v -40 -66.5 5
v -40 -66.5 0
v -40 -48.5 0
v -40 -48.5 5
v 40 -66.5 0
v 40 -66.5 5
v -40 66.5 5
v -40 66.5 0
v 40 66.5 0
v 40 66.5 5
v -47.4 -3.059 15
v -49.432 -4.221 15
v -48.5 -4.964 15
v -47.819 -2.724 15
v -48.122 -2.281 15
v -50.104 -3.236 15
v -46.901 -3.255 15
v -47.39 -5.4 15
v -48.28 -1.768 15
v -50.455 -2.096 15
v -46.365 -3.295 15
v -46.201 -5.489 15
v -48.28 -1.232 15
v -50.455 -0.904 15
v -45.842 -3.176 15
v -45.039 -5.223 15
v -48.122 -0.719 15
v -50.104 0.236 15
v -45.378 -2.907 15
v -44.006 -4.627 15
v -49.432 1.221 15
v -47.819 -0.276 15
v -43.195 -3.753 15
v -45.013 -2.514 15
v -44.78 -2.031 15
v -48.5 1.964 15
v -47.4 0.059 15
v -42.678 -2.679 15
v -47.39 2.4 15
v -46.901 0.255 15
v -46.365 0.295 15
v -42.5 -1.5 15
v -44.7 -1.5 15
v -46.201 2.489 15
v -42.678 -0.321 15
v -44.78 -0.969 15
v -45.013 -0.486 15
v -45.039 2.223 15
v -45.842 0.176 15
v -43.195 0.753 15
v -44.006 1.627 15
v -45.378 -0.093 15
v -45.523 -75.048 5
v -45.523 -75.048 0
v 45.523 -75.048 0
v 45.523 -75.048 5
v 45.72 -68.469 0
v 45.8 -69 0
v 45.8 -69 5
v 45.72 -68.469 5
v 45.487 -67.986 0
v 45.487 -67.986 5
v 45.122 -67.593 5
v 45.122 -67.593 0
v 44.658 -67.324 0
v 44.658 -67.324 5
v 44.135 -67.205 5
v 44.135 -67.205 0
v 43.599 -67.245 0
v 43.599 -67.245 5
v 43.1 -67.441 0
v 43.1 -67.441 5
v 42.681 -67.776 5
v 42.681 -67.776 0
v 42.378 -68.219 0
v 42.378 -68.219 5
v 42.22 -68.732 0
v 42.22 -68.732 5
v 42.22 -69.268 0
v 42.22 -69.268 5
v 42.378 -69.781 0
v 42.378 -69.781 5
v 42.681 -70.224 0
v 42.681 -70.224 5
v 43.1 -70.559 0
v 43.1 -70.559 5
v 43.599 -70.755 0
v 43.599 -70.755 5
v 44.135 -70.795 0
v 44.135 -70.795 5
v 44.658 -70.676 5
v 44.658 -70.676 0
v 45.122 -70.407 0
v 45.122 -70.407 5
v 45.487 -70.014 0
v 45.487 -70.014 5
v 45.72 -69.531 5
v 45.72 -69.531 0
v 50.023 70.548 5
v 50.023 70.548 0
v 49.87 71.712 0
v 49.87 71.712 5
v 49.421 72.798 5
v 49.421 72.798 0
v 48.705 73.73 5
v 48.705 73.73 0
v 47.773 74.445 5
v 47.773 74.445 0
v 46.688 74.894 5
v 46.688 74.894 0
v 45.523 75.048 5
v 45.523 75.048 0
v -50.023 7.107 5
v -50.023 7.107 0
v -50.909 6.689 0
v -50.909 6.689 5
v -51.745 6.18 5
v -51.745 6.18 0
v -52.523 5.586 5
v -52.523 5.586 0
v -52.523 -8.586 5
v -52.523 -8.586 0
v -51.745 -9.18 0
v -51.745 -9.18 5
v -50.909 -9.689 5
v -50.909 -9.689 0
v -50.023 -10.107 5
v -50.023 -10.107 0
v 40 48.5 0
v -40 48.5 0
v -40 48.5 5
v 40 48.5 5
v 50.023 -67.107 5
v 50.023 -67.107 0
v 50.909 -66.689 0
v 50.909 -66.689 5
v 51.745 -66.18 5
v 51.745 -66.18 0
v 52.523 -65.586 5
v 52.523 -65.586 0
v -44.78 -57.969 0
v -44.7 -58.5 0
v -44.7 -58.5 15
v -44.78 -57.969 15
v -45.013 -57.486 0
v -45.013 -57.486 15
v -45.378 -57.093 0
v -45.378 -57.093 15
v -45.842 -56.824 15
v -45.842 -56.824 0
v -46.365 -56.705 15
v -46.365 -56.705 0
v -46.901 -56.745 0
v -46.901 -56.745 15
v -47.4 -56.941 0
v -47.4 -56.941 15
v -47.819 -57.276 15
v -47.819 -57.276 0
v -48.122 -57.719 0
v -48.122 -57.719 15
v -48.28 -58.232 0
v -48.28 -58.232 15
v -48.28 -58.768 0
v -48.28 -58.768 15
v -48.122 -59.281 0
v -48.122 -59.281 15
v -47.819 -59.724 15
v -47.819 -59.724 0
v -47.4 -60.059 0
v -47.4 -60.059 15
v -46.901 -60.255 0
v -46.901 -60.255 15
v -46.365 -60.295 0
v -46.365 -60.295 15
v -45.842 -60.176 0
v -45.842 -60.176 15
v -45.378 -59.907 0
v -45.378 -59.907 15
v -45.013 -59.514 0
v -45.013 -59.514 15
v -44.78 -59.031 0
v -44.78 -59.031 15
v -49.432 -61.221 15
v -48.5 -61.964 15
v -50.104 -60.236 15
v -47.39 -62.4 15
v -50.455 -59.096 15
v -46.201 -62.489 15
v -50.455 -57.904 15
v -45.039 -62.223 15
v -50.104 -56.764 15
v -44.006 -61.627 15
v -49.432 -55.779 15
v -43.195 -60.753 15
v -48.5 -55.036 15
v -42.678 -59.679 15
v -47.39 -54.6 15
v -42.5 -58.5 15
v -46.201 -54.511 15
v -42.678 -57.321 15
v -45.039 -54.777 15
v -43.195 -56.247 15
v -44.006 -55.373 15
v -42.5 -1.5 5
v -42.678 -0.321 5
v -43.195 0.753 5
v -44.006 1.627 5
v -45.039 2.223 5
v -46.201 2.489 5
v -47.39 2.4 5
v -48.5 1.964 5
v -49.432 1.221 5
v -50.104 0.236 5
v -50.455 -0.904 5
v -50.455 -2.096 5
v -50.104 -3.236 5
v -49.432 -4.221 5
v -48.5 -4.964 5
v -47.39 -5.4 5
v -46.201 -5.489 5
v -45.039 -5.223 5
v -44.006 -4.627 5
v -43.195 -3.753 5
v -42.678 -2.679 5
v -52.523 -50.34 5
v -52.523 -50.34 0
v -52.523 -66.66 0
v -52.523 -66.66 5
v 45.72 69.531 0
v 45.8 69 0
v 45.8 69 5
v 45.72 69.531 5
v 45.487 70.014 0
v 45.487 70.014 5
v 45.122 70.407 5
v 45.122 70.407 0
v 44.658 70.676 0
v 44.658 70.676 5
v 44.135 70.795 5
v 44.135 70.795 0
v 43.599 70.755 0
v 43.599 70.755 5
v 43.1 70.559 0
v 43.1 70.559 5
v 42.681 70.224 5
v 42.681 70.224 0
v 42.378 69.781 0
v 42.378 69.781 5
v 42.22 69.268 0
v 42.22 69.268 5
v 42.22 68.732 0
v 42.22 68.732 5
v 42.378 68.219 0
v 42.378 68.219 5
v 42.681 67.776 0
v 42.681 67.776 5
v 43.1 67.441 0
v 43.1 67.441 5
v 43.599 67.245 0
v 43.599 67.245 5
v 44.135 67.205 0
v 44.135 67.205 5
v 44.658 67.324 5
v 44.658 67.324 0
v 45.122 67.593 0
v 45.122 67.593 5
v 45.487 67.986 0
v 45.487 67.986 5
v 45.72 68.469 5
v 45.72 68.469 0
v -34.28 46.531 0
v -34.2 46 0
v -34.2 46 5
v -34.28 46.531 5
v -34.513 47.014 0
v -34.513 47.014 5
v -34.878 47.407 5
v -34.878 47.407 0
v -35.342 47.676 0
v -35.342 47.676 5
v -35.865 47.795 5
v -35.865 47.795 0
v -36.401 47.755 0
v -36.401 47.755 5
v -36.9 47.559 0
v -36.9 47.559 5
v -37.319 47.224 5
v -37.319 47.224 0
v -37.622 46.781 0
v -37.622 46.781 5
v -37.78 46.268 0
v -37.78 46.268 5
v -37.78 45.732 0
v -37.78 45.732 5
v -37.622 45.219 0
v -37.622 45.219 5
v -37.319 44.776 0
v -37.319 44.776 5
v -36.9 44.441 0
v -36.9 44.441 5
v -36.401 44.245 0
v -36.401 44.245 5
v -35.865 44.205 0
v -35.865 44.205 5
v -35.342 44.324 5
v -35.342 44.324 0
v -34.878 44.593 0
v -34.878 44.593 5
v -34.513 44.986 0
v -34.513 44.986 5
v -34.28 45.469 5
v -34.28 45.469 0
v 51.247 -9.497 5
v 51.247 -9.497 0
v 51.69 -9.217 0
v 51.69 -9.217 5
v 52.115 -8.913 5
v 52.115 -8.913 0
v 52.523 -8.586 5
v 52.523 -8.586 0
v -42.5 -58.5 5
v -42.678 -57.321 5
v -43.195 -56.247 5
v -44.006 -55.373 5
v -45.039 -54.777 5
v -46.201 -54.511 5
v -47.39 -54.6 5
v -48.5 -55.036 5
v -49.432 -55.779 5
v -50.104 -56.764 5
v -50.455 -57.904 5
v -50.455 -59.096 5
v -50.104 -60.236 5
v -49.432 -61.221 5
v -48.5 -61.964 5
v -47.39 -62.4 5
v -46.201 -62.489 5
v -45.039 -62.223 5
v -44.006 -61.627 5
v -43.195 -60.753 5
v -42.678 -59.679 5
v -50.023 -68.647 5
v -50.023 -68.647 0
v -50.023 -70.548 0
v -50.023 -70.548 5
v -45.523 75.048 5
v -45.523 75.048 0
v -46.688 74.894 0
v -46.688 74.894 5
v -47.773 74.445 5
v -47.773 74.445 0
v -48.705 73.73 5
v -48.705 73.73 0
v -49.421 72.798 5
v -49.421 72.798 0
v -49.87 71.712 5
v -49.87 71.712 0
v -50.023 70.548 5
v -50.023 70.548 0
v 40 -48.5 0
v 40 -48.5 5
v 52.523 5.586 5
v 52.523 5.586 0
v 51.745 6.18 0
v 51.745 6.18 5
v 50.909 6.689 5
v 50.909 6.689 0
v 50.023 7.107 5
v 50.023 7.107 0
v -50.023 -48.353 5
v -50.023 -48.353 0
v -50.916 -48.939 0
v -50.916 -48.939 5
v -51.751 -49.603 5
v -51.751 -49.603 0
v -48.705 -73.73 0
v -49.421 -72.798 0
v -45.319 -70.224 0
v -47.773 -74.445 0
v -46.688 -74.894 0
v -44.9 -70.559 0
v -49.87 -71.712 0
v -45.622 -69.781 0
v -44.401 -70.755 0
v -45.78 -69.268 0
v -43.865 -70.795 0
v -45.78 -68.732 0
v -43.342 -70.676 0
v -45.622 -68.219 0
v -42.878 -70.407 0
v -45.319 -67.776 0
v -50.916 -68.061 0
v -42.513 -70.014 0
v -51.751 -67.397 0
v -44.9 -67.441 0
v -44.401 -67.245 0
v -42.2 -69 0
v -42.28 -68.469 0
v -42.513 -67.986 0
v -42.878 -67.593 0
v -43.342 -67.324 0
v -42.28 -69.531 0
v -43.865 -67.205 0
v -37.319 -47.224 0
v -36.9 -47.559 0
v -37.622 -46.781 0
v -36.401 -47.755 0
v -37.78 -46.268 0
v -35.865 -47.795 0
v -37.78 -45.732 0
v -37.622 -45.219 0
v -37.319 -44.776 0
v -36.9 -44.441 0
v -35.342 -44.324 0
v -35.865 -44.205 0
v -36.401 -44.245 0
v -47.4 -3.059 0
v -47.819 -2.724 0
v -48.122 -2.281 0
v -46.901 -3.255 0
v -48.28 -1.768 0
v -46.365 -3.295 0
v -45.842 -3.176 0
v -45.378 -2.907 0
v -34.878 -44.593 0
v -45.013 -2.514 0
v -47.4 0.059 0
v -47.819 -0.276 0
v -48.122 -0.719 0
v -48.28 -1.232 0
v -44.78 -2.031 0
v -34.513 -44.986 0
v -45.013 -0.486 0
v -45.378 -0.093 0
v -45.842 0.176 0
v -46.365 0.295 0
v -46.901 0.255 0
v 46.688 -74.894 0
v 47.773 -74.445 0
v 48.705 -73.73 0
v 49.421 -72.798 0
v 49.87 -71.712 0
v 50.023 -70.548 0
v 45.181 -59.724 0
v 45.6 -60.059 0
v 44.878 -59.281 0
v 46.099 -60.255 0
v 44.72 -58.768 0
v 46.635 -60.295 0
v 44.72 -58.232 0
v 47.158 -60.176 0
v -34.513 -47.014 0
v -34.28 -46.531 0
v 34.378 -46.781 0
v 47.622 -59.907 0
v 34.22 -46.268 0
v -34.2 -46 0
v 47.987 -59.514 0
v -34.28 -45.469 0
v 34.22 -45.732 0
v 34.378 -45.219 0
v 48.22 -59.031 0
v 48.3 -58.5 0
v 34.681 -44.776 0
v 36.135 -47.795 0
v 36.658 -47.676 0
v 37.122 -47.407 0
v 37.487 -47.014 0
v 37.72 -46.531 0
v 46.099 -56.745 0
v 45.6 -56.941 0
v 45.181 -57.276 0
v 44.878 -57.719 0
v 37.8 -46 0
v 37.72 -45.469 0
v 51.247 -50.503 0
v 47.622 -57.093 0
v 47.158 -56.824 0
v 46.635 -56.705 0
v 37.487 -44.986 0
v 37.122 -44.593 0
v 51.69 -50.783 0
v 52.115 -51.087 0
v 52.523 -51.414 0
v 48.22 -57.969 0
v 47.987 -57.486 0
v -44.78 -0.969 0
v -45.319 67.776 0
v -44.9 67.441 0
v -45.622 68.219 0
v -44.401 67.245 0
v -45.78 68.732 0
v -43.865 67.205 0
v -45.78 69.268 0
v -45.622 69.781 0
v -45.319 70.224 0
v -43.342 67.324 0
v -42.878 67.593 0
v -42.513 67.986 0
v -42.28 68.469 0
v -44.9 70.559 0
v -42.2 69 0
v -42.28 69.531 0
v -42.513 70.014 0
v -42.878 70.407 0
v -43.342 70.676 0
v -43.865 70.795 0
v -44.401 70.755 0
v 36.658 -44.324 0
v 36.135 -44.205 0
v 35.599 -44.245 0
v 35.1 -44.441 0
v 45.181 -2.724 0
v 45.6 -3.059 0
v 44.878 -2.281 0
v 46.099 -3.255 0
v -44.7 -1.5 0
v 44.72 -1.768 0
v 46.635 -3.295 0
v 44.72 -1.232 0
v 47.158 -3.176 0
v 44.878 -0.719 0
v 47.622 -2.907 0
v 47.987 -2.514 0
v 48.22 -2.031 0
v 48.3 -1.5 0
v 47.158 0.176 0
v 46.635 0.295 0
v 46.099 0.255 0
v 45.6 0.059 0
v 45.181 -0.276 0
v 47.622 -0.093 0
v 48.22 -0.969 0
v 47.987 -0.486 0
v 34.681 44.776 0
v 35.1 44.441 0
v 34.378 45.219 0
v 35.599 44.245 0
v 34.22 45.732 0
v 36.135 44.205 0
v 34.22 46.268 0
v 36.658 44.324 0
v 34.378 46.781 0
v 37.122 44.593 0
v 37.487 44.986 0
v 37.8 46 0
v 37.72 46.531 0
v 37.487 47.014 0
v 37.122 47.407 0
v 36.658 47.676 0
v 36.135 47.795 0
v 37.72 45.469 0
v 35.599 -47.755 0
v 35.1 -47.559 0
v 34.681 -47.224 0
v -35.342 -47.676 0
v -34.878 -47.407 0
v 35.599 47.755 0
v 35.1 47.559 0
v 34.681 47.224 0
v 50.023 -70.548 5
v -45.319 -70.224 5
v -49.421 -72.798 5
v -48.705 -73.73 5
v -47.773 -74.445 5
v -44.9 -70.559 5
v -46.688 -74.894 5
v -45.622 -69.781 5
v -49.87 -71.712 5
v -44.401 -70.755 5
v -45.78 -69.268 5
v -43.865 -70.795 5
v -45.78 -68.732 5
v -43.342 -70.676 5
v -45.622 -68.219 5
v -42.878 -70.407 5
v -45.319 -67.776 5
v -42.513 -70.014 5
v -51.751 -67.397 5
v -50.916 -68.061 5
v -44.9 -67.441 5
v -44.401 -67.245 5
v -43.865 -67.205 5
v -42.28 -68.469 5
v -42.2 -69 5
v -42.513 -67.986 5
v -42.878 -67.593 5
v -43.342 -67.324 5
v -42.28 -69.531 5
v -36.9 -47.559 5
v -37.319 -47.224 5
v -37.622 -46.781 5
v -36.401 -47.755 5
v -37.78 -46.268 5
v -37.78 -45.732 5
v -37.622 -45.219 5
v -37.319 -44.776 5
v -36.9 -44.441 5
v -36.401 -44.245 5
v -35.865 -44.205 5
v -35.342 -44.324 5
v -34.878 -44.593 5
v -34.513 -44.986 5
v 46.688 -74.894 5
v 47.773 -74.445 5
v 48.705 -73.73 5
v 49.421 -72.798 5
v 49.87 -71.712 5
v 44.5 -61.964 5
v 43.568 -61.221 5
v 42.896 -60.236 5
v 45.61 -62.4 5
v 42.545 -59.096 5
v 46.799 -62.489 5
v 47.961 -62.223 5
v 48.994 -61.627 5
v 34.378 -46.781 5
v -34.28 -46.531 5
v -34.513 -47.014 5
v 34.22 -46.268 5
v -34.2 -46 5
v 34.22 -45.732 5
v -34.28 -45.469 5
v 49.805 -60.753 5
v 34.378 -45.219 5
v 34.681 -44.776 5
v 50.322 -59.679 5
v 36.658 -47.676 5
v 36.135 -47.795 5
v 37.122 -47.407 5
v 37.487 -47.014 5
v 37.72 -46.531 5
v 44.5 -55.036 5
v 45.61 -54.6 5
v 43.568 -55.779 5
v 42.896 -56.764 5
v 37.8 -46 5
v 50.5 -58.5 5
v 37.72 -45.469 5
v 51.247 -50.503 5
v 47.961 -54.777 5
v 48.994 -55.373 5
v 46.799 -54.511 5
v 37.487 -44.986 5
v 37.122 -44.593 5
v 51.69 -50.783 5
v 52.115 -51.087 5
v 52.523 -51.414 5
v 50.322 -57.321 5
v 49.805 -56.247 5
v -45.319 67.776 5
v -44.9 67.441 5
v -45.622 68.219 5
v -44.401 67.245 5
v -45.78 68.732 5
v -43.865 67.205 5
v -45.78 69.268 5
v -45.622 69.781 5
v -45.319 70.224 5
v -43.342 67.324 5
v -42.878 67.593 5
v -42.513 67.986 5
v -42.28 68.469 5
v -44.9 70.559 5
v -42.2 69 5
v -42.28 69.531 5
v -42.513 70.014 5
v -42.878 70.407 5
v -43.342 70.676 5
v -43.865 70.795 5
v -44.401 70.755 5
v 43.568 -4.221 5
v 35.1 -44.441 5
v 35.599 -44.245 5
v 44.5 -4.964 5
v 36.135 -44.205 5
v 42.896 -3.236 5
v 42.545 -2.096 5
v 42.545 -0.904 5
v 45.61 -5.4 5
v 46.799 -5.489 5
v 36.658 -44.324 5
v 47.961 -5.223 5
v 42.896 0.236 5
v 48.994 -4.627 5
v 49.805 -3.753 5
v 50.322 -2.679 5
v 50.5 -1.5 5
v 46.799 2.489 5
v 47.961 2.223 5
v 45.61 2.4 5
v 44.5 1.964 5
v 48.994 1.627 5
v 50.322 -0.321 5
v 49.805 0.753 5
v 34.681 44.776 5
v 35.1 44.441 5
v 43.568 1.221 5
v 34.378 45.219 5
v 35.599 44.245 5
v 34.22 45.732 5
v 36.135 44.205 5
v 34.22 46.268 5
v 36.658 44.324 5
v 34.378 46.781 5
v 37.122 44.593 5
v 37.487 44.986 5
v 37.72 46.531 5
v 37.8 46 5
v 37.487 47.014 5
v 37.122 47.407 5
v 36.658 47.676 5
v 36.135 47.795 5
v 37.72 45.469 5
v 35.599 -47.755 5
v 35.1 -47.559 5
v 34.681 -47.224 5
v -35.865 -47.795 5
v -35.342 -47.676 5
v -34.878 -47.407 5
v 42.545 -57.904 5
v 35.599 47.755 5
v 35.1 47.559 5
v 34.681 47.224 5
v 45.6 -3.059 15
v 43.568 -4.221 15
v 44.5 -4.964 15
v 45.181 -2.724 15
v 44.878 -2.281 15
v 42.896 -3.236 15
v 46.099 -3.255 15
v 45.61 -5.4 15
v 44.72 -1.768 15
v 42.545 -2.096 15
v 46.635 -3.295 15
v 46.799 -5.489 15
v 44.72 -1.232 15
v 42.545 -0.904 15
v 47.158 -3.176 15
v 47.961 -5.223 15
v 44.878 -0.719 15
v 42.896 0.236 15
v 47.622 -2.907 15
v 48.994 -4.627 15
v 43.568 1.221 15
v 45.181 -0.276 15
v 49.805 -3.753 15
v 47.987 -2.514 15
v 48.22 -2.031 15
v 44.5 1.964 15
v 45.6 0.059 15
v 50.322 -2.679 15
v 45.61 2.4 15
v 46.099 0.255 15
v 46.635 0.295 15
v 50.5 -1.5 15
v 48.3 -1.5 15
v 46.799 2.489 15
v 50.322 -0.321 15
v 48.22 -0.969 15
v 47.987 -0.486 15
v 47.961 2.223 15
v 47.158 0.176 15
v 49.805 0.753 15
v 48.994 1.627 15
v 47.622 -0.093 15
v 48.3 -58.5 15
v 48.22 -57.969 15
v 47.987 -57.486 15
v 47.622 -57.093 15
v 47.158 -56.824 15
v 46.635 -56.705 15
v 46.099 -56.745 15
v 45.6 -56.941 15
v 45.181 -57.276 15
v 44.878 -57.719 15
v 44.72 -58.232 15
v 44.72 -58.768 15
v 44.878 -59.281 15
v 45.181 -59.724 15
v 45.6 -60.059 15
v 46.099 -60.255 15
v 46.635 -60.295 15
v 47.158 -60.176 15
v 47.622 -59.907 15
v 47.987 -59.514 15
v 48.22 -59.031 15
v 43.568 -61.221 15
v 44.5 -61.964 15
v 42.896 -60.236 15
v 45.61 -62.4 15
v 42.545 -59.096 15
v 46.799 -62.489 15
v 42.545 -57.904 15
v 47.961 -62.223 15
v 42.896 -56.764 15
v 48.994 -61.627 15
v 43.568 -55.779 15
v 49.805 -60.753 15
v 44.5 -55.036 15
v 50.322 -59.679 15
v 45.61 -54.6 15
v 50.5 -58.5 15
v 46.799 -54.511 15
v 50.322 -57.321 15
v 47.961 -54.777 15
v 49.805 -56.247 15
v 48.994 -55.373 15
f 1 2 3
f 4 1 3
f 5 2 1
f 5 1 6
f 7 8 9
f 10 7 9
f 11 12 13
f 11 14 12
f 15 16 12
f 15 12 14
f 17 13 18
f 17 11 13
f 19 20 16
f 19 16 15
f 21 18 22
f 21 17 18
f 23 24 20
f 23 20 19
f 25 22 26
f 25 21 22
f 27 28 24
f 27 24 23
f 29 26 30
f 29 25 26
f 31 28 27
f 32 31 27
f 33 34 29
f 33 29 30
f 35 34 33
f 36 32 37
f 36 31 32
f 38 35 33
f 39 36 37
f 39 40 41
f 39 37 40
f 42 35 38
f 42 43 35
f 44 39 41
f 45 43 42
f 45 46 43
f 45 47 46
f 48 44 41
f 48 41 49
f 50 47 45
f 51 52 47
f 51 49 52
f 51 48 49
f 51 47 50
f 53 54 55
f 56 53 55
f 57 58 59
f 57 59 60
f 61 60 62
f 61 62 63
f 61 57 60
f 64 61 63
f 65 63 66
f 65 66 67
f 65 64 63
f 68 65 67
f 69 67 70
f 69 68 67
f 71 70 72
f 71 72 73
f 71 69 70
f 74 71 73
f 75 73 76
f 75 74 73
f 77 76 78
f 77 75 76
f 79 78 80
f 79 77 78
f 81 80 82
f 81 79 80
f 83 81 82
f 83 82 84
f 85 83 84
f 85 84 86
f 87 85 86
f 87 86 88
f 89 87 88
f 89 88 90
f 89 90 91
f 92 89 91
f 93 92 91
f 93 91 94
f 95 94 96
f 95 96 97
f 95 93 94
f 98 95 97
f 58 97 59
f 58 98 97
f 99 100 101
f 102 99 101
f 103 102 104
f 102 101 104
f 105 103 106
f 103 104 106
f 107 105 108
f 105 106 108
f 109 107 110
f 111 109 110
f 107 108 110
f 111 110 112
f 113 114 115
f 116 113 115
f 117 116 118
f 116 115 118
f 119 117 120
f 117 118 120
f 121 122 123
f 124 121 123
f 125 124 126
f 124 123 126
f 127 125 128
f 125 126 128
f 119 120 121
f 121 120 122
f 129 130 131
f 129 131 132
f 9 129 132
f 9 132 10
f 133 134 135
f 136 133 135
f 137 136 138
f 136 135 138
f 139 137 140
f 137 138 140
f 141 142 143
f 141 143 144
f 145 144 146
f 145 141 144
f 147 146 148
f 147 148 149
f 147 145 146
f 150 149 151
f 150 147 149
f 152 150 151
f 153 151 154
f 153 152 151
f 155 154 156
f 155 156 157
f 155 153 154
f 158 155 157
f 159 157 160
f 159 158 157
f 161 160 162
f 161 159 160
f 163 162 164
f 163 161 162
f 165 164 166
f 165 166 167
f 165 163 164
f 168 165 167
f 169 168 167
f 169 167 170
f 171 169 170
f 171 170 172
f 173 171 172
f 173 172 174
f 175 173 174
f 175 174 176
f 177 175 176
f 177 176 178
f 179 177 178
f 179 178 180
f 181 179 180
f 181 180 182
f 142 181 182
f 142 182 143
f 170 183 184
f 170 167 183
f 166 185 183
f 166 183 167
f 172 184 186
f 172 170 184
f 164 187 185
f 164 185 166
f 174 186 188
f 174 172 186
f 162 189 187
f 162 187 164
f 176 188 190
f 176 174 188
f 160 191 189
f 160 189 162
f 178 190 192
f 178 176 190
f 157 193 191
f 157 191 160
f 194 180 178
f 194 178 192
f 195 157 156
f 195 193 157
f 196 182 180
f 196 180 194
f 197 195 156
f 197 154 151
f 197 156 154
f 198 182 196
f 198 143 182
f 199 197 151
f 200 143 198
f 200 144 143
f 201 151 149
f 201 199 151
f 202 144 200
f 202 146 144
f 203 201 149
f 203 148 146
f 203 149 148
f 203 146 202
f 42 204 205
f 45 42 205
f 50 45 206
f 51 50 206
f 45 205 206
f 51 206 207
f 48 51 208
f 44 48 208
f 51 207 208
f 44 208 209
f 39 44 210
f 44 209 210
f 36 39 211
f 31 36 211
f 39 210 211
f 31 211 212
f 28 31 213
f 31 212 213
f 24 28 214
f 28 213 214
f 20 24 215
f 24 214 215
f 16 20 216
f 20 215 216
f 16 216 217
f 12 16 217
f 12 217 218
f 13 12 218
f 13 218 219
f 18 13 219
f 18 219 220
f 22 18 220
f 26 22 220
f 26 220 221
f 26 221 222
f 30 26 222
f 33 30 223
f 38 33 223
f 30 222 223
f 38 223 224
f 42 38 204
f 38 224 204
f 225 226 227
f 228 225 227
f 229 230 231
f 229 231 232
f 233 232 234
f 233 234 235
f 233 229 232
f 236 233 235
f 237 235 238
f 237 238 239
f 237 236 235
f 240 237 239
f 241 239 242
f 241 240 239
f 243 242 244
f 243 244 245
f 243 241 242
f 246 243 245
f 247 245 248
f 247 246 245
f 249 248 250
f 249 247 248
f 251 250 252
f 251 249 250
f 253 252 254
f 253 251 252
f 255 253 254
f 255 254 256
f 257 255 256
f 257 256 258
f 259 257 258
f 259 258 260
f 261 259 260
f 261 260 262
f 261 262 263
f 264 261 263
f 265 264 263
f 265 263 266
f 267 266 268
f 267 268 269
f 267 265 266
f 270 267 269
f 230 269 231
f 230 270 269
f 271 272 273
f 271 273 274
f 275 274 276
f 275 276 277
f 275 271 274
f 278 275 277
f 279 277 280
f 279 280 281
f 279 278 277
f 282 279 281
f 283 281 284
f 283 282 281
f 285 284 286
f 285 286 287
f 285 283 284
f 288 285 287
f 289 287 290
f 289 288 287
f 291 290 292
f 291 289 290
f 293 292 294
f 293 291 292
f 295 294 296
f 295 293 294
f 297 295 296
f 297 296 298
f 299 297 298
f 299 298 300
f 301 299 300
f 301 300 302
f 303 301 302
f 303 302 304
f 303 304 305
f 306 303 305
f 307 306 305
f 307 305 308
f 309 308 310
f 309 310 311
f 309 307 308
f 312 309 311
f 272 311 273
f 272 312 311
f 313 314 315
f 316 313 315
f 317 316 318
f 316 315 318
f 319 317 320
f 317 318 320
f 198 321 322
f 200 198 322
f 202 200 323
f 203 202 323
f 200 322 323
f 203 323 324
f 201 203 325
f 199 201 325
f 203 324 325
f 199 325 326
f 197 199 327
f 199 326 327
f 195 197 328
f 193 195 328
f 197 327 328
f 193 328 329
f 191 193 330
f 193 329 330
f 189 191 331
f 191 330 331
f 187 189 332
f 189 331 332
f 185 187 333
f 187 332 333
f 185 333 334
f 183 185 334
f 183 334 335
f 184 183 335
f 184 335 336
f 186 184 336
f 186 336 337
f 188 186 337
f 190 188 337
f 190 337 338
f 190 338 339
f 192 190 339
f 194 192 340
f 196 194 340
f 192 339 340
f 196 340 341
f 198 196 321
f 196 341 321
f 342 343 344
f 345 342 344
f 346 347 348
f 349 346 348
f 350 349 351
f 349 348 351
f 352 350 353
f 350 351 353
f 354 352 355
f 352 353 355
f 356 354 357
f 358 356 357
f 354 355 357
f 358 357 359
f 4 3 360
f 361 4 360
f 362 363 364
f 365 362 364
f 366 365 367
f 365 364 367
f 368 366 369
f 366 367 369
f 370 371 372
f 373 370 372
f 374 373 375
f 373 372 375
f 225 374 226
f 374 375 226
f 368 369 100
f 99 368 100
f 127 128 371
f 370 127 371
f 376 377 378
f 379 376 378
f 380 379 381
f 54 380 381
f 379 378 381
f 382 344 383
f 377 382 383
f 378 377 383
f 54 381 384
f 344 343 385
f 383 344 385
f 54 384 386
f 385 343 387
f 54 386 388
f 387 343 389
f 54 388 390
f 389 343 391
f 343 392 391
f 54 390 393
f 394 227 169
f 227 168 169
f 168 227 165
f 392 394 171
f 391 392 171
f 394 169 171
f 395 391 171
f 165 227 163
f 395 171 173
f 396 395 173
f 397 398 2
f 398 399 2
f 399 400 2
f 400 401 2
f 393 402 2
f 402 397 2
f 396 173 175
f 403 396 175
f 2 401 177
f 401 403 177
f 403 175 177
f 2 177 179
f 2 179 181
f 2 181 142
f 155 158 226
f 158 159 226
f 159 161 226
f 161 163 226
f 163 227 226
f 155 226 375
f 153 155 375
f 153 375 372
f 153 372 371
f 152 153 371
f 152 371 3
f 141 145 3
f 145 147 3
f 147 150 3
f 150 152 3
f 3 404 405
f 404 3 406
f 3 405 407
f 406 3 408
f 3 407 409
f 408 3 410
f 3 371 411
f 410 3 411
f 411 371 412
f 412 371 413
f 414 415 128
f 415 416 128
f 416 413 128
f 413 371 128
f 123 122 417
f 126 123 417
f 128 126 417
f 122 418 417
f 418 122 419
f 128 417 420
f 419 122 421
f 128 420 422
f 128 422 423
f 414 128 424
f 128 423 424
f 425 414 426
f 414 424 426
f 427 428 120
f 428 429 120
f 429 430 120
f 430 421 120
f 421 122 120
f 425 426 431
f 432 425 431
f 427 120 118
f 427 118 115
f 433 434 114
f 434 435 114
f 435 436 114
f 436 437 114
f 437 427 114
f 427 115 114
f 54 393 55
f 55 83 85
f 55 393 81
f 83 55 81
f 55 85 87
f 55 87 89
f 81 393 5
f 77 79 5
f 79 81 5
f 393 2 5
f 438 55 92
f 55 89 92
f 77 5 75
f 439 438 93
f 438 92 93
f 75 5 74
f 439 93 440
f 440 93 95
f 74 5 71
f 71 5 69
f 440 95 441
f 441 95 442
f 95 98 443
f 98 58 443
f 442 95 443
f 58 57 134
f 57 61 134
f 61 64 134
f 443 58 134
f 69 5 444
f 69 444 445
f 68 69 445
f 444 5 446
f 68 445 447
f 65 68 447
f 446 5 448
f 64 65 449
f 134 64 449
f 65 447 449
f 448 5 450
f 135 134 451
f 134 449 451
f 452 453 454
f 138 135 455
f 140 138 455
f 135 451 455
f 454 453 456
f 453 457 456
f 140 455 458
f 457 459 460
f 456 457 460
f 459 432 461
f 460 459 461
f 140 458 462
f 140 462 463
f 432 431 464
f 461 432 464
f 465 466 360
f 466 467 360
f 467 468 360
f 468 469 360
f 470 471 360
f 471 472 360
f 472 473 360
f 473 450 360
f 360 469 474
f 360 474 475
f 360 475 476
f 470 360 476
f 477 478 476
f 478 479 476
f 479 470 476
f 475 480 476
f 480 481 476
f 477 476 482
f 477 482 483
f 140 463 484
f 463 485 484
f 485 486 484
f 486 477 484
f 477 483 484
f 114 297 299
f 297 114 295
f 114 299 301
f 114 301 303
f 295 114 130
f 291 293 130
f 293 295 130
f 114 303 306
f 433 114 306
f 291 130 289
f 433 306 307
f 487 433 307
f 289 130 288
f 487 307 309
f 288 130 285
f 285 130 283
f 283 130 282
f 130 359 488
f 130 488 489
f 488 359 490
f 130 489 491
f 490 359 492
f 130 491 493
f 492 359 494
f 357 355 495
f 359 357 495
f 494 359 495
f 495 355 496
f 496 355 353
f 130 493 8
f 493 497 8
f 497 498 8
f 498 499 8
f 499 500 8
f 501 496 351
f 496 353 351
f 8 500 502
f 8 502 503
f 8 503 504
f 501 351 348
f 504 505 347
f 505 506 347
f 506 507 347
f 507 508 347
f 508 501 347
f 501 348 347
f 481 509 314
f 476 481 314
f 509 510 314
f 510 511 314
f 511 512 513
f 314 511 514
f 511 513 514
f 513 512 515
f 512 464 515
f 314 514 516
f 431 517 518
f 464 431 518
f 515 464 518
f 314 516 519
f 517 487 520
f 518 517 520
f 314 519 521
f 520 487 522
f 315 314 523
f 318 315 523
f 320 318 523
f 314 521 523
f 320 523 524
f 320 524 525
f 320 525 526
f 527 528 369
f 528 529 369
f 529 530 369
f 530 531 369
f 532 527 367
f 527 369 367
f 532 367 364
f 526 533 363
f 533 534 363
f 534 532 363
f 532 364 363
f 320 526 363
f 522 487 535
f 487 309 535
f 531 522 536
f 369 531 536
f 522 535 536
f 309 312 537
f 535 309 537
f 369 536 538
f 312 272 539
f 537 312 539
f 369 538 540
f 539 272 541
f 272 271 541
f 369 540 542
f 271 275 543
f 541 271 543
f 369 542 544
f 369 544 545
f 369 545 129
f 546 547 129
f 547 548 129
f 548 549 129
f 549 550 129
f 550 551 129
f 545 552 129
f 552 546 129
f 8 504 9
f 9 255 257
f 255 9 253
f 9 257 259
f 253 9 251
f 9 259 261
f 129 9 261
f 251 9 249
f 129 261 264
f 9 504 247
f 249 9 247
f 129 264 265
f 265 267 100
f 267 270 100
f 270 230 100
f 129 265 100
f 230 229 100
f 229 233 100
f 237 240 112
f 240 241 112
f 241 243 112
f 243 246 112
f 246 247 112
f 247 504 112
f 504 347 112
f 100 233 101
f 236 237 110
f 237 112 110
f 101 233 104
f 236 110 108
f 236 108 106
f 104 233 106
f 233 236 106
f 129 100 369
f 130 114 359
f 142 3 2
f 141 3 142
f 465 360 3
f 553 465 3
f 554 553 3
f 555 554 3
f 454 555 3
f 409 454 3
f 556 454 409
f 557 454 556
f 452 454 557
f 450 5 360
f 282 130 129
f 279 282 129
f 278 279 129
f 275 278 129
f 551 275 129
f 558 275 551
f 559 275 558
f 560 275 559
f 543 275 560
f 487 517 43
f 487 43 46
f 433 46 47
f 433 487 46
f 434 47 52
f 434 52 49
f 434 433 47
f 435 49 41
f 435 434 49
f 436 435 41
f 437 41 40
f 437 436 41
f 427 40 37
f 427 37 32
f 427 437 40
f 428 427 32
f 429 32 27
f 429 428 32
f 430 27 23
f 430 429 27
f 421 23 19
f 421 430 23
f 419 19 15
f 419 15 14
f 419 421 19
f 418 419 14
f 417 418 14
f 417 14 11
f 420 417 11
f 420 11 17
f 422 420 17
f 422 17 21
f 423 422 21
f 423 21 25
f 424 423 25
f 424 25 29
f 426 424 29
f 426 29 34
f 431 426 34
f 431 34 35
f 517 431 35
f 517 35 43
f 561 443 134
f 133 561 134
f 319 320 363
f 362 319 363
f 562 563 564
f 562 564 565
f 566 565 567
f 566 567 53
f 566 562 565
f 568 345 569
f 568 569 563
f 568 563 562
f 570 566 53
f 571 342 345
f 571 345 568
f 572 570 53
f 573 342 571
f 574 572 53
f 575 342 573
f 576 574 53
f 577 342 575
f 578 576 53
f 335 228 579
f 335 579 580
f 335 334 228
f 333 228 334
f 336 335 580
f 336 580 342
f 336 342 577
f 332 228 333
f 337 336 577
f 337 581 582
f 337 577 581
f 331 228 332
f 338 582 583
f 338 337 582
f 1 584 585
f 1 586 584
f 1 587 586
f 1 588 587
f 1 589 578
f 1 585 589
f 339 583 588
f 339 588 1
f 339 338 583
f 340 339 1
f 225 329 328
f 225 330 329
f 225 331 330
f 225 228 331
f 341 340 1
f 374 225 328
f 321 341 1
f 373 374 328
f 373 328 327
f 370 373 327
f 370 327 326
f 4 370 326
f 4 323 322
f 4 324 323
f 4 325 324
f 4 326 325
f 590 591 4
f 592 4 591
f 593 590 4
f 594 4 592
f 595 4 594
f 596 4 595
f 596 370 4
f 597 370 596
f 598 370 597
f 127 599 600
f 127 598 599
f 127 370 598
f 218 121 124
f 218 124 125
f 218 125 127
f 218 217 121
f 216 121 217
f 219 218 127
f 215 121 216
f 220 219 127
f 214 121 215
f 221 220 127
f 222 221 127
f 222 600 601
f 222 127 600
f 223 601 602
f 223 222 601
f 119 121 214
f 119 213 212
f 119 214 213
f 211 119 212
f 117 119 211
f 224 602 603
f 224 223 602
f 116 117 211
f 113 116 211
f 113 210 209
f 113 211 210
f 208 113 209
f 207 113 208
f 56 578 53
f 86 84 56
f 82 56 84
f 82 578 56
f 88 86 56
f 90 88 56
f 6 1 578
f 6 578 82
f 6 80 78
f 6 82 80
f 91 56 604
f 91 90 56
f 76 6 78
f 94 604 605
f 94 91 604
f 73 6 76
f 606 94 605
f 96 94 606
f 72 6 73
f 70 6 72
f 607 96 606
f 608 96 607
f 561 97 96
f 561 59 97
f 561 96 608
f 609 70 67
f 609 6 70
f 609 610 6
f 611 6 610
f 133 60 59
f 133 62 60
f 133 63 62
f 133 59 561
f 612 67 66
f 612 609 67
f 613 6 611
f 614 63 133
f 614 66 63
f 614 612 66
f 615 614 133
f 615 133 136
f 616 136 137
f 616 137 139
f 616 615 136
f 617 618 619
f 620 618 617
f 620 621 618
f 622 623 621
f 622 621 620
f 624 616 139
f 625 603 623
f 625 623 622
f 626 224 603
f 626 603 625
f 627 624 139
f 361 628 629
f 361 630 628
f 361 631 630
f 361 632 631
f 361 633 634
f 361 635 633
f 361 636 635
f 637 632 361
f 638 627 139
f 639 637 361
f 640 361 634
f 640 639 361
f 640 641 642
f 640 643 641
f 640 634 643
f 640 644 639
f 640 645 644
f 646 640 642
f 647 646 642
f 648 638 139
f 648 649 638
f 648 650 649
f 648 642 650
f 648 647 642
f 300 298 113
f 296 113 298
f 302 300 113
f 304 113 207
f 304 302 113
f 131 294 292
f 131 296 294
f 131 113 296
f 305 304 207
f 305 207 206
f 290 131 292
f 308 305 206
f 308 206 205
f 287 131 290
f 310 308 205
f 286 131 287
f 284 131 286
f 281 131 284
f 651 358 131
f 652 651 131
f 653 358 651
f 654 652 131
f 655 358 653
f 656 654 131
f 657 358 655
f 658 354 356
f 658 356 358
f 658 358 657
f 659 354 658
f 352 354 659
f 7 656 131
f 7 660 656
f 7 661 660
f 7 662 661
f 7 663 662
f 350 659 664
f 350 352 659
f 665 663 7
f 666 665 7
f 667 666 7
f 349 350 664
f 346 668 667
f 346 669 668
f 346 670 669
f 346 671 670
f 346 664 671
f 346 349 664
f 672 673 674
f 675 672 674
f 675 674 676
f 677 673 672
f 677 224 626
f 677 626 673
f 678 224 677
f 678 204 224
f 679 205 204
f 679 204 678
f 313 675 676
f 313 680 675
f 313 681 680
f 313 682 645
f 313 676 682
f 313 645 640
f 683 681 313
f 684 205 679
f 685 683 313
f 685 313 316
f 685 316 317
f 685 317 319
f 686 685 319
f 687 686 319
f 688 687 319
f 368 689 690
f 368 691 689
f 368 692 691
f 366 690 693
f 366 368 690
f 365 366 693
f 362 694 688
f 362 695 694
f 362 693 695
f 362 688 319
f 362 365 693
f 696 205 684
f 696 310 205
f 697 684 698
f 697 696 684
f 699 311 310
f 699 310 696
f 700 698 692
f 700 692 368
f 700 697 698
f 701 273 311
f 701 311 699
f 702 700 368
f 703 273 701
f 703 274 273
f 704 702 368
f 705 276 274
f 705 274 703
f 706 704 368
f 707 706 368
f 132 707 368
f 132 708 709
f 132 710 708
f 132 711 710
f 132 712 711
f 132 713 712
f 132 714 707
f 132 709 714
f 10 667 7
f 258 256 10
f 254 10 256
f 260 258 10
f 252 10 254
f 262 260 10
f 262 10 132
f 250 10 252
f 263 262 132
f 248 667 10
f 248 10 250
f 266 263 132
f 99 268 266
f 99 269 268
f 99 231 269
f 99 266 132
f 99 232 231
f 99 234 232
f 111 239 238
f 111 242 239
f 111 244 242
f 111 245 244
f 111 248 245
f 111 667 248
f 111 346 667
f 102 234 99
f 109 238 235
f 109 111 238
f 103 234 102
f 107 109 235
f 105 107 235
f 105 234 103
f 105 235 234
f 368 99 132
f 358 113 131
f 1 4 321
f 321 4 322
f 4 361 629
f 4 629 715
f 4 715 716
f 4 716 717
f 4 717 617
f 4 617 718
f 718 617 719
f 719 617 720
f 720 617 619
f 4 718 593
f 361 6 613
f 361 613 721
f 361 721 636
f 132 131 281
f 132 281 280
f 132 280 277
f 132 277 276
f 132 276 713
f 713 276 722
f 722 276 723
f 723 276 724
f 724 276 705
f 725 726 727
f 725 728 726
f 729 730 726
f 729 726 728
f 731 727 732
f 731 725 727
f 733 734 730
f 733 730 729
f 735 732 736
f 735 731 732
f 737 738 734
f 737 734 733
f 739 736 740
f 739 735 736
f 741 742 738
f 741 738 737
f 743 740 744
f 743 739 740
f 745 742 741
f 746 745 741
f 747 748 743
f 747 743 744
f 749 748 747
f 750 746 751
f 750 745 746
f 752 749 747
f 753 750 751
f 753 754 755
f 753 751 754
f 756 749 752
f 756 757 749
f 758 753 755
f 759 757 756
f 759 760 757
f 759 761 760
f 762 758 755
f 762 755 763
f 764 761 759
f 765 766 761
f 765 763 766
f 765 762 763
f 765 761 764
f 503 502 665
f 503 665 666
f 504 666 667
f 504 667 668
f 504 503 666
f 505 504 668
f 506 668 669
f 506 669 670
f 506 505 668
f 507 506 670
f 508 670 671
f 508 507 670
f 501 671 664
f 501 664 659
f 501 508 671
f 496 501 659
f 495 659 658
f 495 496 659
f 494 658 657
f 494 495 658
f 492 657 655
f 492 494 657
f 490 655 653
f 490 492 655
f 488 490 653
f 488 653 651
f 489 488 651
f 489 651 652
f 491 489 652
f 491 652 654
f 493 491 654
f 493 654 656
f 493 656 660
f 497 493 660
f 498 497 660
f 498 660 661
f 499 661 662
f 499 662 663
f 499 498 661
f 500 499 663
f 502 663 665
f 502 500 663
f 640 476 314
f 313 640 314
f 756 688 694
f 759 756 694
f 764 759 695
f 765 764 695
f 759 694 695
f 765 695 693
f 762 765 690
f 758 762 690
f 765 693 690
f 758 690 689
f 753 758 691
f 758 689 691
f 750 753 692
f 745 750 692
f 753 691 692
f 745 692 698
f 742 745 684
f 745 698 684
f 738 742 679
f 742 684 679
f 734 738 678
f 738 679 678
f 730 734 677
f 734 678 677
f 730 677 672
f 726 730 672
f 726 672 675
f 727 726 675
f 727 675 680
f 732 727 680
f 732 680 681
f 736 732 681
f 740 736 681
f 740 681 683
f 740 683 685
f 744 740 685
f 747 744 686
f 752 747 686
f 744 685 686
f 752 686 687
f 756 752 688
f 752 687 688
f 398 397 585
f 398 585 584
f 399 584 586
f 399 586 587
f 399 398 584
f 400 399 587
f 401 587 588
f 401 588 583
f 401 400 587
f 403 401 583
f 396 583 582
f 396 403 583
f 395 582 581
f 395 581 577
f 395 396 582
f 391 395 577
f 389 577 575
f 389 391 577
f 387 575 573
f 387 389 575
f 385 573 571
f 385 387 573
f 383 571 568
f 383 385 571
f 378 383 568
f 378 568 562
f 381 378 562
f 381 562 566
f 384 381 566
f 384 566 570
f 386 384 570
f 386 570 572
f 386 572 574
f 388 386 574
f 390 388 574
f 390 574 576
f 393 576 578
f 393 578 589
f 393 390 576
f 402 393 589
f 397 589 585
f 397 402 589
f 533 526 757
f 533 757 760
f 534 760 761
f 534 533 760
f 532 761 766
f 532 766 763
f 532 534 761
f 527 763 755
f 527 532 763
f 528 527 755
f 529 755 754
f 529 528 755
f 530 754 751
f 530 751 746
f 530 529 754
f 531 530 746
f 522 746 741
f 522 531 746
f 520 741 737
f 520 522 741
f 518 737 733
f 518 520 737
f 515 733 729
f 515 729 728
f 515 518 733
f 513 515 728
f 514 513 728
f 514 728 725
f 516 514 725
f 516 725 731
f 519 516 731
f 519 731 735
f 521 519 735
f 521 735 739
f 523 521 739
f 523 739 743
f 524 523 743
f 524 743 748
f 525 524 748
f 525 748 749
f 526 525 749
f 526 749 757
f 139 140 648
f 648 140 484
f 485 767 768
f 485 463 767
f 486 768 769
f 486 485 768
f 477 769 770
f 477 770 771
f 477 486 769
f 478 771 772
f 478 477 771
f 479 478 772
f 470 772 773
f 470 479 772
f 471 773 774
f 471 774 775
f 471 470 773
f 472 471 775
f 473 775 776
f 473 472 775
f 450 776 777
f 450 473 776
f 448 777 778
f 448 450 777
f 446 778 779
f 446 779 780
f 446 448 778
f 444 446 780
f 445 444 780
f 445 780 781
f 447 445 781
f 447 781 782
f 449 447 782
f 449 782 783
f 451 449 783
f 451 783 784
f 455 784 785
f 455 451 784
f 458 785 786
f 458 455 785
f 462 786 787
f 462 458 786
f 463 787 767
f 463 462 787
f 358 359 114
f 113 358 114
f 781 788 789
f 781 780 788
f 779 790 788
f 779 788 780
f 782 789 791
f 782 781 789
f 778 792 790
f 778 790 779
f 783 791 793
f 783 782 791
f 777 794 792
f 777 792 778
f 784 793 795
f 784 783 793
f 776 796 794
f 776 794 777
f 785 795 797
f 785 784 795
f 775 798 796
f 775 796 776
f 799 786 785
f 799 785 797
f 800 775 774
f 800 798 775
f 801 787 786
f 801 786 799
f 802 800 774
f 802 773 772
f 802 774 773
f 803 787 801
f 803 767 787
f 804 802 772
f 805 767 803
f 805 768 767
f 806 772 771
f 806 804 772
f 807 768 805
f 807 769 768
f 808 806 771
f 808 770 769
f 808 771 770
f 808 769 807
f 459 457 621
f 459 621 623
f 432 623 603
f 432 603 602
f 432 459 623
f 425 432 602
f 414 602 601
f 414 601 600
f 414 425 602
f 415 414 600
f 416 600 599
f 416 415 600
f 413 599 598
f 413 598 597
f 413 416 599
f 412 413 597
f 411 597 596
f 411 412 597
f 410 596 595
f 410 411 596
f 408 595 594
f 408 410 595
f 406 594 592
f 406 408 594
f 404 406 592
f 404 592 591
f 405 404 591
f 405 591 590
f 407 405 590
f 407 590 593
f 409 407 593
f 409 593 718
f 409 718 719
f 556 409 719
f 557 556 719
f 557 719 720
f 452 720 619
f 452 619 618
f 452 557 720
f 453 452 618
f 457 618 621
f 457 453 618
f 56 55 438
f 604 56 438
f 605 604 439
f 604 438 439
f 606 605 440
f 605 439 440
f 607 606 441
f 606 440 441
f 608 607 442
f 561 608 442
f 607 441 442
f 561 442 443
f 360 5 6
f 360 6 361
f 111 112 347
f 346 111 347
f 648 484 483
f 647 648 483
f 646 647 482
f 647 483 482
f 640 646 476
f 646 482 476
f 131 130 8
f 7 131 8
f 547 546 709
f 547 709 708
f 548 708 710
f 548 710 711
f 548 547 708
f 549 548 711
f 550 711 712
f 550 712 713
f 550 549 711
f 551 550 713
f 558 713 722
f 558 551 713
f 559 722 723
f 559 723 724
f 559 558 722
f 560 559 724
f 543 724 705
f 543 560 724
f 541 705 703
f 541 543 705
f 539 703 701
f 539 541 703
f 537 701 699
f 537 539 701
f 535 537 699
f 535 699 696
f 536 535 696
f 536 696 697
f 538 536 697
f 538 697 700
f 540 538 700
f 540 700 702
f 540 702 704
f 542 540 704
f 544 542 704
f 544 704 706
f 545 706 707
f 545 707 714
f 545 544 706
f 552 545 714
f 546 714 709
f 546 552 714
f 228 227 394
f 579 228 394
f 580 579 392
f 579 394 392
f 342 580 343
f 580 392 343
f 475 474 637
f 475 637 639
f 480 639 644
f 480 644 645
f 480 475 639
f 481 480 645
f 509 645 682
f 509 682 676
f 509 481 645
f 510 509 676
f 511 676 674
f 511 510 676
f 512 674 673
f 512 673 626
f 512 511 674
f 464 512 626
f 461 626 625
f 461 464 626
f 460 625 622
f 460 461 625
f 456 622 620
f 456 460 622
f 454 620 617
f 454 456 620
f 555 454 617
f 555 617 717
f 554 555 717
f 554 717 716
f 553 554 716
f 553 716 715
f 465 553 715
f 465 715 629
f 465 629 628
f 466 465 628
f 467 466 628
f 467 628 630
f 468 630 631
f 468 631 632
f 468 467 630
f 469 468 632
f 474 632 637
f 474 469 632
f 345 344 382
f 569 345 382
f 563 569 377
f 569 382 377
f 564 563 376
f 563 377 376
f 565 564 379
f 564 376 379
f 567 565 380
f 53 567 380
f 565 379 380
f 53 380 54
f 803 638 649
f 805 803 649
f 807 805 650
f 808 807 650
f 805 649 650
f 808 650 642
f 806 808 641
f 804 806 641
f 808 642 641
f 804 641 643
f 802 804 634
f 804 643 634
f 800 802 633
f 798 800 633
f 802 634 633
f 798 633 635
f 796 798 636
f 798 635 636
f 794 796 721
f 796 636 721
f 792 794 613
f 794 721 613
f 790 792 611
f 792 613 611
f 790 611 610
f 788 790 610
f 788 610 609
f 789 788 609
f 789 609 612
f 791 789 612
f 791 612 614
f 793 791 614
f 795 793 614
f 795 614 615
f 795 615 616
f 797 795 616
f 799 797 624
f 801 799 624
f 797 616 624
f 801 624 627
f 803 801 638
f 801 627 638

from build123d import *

# Parameters (mm, degrees)
F0_R     = 1.8
F0_W     = 80
F0_H     = 18
F1_DEPTH = 5
F2_R     = 4
F2_R_2   = 1.8
F3_DEPTH = 10


with BuildPart() as f1:
    # F0 (on Top) → F1 (new body)
    with BuildSketch(Plane.XY):
        with BuildLine():
            Line((-50.0234800036, -68.6468068202), (-50.0234800036, -70.5475468516))
            ThreePointArc((-50.0234800036, -70.5475468516), (-48.705460519, -73.7295273669), (-45.5234800036, -75.0475468516))
            Line((-45.5234800036, -75.0475468516), (45.5234800036, -75.0475468516))
            ThreePointArc((45.5234800036, -75.0475468516), (48.705460519, -73.7295273669), (50.0234800036, -70.5475468516))
            Line((50.0234800036, -70.5475468516), (50.0234800036, -67.1066886004))
            ThreePointArc((50.0234800036, -67.1066886004), (51.3336770397, -66.4451599276), (52.5234800036, -65.5857383981))
            Line((52.5234800036, -65.5857383981), (52.5234800036, -51.4142616019))
            ThreePointArc((52.5234800036, -51.4142616019), (51.9046419222, -50.9316550229), (51.2473189859, -50.5029403875))
            Line((51.2473189859, -50.5029403875), (51.2473189859, -9.4970596125))
            ThreePointArc((51.2473189859, -9.4970596125), (51.9046419222, -9.0683449771), (52.5234800036, -8.5857383981))
            Line((52.5234800036, -8.5857383981), (52.5234800036, 5.5857383981))
            ThreePointArc((52.5234800036, 5.5857383981), (51.3336770397, 6.4451599276), (50.0234800036, 7.1066886004))
            Line((50.0234800036, 7.1066886004), (50.0234800036, 70.5475468516))
            ThreePointArc((50.0234800036, 70.5475468516), (48.705460519, 73.7295273669), (45.5234800036, 75.0475468516))
            Line((45.5234800036, 75.0475468516), (-45.5234800036, 75.0475468516))
            ThreePointArc((-45.5234800036, 75.0475468516), (-48.705460519, 73.7295273669), (-50.0234800036, 70.5475468516))
            Line((-50.0234800036, 70.5475468516), (-50.0234800036, 7.1066886004))
            ThreePointArc((-50.0234800036, 7.1066886004), (-51.3336770397, 6.4451599276), (-52.5234800036, 5.5857383981))
            Line((-52.5234800036, 5.5857383981), (-52.5234800036, -8.5857383981))
            ThreePointArc((-52.5234800036, -8.5857383981), (-51.3336770397, -9.4451599276), (-50.0234800036, -10.1066886004))
            Line((-50.0234800036, -10.1066886004), (-50.0234800036, -48.3531931798))
            ThreePointArc((-50.0234800036, -48.3531931798), (-51.3409860595, -49.2614977581), (-52.5234800036, -50.3397127117))
            Line((-52.5234800036, -50.3397127117), (-52.5234800036, -66.6602872883))
            ThreePointArc((-52.5234800036, -66.6602872883), (-51.3409860595, -67.7385022419), (-50.0234800036, -68.6468068202))
        make_face()
        with Locations((-44, -69)):
            Circle(F0_R, mode=Mode.SUBTRACT)
        with Locations((-46.5, -58.5)):
            Circle(F0_R, mode=Mode.SUBTRACT)
        with Locations((-36, -46)):
            Circle(F0_R, mode=Mode.SUBTRACT)
        with Locations((-46.5, -1.5)):
            Circle(F0_R, mode=Mode.SUBTRACT)
        with Locations((0, -57.5)):
            Rectangle(F0_W, F0_H, mode=Mode.SUBTRACT)
        with Locations((44, -69)):
            Circle(F0_R, mode=Mode.SUBTRACT)
        with Locations((46.5, -58.5)):
            Circle(F0_R, mode=Mode.SUBTRACT)
        with Locations((36, -46)):
            Circle(F0_R, mode=Mode.SUBTRACT)
        with Locations((46.5, -1.5)):
            Circle(F0_R, mode=Mode.SUBTRACT)
        with Locations((-36, 46)):
            Circle(F0_R, mode=Mode.SUBTRACT)
        with Locations((-44, 69)):
            Circle(F0_R, mode=Mode.SUBTRACT)
        with Locations((0, 57.5)):
            Rectangle(F0_W, F0_H, mode=Mode.SUBTRACT)
        with Locations((36, 46)):
            Circle(F0_R, mode=Mode.SUBTRACT)
        with Locations((44, 69)):
            Circle(F0_R, mode=Mode.SUBTRACT)
    extrude(amount=F1_DEPTH)

    # F2 (on face) → F3 (join)
    with BuildSketch(Plane.XY.offset(5)):
        with Locations((46.5, -58.5)):
            Circle(F2_R)
        with Locations((46.5, -58.5)):
            Circle(F2_R_2, mode=Mode.SUBTRACT)
        with Locations((-46.5, -58.5)):
            Circle(F2_R)
        with Locations((-46.5, -58.5)):
            Circle(F2_R_2, mode=Mode.SUBTRACT)
        with Locations((-46.5, -1.5)):
            Circle(F2_R)
        with Locations((-46.5, -1.5)):
            Circle(F2_R_2, mode=Mode.SUBTRACT)
        with Locations((46.5, -1.5)):
            Circle(F2_R)
        with Locations((46.5, -1.5)):
            Circle(F2_R_2, mode=Mode.SUBTRACT)
    extrude(amount=F3_DEPTH)


solid = f1.part
